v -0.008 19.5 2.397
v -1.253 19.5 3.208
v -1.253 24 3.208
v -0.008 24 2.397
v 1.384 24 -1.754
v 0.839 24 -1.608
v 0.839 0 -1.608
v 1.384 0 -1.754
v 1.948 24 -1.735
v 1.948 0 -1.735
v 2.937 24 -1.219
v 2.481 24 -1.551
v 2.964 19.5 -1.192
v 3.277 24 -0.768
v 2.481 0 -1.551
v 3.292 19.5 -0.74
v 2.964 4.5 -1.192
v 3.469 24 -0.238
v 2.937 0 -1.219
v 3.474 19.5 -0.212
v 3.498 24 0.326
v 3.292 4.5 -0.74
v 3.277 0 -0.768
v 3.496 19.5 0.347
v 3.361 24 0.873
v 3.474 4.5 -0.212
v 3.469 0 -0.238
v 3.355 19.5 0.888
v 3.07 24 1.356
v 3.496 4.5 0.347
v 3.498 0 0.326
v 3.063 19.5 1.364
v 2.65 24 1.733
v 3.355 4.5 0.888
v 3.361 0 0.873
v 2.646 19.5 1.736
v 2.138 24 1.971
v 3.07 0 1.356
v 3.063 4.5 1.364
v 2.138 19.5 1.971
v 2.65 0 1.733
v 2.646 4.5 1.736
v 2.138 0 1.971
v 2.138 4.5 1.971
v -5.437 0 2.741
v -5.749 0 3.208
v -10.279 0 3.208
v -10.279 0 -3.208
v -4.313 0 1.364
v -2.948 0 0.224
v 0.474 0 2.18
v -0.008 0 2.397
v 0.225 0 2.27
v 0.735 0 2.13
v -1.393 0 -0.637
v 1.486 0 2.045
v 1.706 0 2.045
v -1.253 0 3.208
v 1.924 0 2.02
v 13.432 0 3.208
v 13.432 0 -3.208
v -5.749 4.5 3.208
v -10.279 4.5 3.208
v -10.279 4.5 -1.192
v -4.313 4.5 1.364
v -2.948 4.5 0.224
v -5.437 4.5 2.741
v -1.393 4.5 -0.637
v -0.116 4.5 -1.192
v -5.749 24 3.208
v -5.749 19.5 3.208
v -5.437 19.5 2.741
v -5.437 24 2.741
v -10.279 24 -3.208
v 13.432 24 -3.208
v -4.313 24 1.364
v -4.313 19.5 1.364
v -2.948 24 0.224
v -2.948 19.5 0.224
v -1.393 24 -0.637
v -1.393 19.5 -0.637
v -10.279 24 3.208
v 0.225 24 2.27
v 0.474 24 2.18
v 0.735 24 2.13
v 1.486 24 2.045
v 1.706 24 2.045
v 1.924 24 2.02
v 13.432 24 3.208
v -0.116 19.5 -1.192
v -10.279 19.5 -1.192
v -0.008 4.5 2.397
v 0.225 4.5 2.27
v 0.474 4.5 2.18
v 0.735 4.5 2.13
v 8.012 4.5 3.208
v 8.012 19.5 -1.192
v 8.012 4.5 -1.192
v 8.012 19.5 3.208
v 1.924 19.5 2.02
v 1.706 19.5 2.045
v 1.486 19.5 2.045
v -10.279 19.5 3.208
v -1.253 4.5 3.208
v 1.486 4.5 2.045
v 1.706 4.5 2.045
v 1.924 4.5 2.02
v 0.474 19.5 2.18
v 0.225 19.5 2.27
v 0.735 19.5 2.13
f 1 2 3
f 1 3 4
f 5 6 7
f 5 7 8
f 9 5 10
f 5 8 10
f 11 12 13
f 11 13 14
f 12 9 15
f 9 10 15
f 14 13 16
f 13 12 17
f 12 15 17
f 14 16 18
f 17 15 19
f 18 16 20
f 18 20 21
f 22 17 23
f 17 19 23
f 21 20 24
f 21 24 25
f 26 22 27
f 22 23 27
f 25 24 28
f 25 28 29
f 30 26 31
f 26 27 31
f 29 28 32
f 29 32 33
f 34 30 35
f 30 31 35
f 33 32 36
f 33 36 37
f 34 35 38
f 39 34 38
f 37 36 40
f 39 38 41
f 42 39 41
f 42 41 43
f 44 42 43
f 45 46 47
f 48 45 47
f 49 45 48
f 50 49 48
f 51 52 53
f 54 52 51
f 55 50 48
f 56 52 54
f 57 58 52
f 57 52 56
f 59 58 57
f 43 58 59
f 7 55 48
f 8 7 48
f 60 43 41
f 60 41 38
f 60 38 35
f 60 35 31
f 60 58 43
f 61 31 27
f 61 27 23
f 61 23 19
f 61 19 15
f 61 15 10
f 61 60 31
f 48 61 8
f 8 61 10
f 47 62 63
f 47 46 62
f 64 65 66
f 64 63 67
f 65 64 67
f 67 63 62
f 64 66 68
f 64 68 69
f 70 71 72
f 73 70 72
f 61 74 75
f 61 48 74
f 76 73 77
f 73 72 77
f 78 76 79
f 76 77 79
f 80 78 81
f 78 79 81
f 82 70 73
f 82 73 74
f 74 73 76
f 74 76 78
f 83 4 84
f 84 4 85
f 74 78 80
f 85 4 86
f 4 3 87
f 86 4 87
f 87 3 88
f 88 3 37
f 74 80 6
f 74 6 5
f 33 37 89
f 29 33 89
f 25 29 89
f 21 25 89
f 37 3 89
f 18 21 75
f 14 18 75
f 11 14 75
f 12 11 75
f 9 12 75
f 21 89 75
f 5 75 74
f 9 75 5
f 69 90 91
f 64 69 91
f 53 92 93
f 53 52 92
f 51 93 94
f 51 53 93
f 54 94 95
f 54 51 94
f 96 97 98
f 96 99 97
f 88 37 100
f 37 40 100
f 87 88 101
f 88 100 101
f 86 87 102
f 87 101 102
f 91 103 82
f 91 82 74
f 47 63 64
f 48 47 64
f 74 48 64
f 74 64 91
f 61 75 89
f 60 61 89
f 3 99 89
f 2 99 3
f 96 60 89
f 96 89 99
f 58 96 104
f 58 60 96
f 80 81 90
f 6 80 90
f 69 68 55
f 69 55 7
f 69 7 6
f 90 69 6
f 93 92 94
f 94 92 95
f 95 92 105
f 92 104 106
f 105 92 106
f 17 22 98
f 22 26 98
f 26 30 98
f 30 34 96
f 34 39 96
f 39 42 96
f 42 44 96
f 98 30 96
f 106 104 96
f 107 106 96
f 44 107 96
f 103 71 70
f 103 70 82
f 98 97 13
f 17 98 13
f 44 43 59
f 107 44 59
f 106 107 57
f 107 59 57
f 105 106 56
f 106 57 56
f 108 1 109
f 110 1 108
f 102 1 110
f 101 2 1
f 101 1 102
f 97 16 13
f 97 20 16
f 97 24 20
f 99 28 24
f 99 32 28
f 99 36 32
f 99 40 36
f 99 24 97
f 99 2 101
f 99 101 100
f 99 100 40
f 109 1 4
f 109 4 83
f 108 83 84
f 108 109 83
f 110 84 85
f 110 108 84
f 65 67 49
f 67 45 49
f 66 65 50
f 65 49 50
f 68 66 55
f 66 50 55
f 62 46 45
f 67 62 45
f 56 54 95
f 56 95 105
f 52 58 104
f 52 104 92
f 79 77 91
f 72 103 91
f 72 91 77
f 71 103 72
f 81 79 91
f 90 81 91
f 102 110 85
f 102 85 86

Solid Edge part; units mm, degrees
sketch "Sketch1" plane through (0, 0, 0) normal (0, -1, 0) x (1, 0, 0)
  line L0 (13.4324, 3.2075) -> (-1.253, 3.2075)
  line L1 (-1.253, 3.2075) -> (-0.0083, 2.3972)
  arc A0 (-0.0083, 2.3972) -> (0.7346, 2.1301) centre (0.9285, 3.8363) ccw
  line L2 (0.7346, 2.1301) -> (2.1383, 1.9706)
  arc A1 (2.1383, 1.9706) -> (0.8387, -1.6081) centre (1.5999, 0.1408) cw
  line L3 (-1.3928, -0.6369) -> (0.8387, -1.6081)
  arc A2 (-5.4369, 2.7406) -> (-1.3928, -0.6369) centre (2.3423, 7.9454) ccw
  line L4 (-5.7493, 3.2075) -> (-5.4369, 2.7406)
  line L5 (-5.7493, 3.2075) -> (-10.2791, 3.2075)
  line L6 (-10.2791, 3.2075) -> (-10.2791, -3.2075)
  line L7 (-10.2791, -3.2075) -> (13.4324, -3.2075)
  line L8 (13.4324, -3.2075) -> (13.4324, 3.2075)
extrude "Protrusion1" add sketch "Sketch1" against normal blind 24
sketch "Sketch2" plane through (4.513, 12, 3.2075) normal (0, 0, 1) x (1, 0, 0)
  line L0 (-14.7921, 7.5) -> (3.4988, 7.5)
  line L1 (3.4988, 7.5) -> (3.4988, -7.5)
  line L2 (-14.7921, -7.5) -> (3.4988, -7.5)
  line L3 (-14.7921, 7.5) -> (-14.7921, -7.5)
extrude "Cutout1" cut sketch "Sketch2" against normal blind 4.4
sketch "Sketch3" plane through (1.5766, 0, 0) normal (0, -1, 0) x (1, 0, 0)
  circle A0 centre (0.0232, 0.1408) radius 1.9073
extrude "ScavoEstrusione_2" cut sketch "Sketch3" against normal blind 40.5632
